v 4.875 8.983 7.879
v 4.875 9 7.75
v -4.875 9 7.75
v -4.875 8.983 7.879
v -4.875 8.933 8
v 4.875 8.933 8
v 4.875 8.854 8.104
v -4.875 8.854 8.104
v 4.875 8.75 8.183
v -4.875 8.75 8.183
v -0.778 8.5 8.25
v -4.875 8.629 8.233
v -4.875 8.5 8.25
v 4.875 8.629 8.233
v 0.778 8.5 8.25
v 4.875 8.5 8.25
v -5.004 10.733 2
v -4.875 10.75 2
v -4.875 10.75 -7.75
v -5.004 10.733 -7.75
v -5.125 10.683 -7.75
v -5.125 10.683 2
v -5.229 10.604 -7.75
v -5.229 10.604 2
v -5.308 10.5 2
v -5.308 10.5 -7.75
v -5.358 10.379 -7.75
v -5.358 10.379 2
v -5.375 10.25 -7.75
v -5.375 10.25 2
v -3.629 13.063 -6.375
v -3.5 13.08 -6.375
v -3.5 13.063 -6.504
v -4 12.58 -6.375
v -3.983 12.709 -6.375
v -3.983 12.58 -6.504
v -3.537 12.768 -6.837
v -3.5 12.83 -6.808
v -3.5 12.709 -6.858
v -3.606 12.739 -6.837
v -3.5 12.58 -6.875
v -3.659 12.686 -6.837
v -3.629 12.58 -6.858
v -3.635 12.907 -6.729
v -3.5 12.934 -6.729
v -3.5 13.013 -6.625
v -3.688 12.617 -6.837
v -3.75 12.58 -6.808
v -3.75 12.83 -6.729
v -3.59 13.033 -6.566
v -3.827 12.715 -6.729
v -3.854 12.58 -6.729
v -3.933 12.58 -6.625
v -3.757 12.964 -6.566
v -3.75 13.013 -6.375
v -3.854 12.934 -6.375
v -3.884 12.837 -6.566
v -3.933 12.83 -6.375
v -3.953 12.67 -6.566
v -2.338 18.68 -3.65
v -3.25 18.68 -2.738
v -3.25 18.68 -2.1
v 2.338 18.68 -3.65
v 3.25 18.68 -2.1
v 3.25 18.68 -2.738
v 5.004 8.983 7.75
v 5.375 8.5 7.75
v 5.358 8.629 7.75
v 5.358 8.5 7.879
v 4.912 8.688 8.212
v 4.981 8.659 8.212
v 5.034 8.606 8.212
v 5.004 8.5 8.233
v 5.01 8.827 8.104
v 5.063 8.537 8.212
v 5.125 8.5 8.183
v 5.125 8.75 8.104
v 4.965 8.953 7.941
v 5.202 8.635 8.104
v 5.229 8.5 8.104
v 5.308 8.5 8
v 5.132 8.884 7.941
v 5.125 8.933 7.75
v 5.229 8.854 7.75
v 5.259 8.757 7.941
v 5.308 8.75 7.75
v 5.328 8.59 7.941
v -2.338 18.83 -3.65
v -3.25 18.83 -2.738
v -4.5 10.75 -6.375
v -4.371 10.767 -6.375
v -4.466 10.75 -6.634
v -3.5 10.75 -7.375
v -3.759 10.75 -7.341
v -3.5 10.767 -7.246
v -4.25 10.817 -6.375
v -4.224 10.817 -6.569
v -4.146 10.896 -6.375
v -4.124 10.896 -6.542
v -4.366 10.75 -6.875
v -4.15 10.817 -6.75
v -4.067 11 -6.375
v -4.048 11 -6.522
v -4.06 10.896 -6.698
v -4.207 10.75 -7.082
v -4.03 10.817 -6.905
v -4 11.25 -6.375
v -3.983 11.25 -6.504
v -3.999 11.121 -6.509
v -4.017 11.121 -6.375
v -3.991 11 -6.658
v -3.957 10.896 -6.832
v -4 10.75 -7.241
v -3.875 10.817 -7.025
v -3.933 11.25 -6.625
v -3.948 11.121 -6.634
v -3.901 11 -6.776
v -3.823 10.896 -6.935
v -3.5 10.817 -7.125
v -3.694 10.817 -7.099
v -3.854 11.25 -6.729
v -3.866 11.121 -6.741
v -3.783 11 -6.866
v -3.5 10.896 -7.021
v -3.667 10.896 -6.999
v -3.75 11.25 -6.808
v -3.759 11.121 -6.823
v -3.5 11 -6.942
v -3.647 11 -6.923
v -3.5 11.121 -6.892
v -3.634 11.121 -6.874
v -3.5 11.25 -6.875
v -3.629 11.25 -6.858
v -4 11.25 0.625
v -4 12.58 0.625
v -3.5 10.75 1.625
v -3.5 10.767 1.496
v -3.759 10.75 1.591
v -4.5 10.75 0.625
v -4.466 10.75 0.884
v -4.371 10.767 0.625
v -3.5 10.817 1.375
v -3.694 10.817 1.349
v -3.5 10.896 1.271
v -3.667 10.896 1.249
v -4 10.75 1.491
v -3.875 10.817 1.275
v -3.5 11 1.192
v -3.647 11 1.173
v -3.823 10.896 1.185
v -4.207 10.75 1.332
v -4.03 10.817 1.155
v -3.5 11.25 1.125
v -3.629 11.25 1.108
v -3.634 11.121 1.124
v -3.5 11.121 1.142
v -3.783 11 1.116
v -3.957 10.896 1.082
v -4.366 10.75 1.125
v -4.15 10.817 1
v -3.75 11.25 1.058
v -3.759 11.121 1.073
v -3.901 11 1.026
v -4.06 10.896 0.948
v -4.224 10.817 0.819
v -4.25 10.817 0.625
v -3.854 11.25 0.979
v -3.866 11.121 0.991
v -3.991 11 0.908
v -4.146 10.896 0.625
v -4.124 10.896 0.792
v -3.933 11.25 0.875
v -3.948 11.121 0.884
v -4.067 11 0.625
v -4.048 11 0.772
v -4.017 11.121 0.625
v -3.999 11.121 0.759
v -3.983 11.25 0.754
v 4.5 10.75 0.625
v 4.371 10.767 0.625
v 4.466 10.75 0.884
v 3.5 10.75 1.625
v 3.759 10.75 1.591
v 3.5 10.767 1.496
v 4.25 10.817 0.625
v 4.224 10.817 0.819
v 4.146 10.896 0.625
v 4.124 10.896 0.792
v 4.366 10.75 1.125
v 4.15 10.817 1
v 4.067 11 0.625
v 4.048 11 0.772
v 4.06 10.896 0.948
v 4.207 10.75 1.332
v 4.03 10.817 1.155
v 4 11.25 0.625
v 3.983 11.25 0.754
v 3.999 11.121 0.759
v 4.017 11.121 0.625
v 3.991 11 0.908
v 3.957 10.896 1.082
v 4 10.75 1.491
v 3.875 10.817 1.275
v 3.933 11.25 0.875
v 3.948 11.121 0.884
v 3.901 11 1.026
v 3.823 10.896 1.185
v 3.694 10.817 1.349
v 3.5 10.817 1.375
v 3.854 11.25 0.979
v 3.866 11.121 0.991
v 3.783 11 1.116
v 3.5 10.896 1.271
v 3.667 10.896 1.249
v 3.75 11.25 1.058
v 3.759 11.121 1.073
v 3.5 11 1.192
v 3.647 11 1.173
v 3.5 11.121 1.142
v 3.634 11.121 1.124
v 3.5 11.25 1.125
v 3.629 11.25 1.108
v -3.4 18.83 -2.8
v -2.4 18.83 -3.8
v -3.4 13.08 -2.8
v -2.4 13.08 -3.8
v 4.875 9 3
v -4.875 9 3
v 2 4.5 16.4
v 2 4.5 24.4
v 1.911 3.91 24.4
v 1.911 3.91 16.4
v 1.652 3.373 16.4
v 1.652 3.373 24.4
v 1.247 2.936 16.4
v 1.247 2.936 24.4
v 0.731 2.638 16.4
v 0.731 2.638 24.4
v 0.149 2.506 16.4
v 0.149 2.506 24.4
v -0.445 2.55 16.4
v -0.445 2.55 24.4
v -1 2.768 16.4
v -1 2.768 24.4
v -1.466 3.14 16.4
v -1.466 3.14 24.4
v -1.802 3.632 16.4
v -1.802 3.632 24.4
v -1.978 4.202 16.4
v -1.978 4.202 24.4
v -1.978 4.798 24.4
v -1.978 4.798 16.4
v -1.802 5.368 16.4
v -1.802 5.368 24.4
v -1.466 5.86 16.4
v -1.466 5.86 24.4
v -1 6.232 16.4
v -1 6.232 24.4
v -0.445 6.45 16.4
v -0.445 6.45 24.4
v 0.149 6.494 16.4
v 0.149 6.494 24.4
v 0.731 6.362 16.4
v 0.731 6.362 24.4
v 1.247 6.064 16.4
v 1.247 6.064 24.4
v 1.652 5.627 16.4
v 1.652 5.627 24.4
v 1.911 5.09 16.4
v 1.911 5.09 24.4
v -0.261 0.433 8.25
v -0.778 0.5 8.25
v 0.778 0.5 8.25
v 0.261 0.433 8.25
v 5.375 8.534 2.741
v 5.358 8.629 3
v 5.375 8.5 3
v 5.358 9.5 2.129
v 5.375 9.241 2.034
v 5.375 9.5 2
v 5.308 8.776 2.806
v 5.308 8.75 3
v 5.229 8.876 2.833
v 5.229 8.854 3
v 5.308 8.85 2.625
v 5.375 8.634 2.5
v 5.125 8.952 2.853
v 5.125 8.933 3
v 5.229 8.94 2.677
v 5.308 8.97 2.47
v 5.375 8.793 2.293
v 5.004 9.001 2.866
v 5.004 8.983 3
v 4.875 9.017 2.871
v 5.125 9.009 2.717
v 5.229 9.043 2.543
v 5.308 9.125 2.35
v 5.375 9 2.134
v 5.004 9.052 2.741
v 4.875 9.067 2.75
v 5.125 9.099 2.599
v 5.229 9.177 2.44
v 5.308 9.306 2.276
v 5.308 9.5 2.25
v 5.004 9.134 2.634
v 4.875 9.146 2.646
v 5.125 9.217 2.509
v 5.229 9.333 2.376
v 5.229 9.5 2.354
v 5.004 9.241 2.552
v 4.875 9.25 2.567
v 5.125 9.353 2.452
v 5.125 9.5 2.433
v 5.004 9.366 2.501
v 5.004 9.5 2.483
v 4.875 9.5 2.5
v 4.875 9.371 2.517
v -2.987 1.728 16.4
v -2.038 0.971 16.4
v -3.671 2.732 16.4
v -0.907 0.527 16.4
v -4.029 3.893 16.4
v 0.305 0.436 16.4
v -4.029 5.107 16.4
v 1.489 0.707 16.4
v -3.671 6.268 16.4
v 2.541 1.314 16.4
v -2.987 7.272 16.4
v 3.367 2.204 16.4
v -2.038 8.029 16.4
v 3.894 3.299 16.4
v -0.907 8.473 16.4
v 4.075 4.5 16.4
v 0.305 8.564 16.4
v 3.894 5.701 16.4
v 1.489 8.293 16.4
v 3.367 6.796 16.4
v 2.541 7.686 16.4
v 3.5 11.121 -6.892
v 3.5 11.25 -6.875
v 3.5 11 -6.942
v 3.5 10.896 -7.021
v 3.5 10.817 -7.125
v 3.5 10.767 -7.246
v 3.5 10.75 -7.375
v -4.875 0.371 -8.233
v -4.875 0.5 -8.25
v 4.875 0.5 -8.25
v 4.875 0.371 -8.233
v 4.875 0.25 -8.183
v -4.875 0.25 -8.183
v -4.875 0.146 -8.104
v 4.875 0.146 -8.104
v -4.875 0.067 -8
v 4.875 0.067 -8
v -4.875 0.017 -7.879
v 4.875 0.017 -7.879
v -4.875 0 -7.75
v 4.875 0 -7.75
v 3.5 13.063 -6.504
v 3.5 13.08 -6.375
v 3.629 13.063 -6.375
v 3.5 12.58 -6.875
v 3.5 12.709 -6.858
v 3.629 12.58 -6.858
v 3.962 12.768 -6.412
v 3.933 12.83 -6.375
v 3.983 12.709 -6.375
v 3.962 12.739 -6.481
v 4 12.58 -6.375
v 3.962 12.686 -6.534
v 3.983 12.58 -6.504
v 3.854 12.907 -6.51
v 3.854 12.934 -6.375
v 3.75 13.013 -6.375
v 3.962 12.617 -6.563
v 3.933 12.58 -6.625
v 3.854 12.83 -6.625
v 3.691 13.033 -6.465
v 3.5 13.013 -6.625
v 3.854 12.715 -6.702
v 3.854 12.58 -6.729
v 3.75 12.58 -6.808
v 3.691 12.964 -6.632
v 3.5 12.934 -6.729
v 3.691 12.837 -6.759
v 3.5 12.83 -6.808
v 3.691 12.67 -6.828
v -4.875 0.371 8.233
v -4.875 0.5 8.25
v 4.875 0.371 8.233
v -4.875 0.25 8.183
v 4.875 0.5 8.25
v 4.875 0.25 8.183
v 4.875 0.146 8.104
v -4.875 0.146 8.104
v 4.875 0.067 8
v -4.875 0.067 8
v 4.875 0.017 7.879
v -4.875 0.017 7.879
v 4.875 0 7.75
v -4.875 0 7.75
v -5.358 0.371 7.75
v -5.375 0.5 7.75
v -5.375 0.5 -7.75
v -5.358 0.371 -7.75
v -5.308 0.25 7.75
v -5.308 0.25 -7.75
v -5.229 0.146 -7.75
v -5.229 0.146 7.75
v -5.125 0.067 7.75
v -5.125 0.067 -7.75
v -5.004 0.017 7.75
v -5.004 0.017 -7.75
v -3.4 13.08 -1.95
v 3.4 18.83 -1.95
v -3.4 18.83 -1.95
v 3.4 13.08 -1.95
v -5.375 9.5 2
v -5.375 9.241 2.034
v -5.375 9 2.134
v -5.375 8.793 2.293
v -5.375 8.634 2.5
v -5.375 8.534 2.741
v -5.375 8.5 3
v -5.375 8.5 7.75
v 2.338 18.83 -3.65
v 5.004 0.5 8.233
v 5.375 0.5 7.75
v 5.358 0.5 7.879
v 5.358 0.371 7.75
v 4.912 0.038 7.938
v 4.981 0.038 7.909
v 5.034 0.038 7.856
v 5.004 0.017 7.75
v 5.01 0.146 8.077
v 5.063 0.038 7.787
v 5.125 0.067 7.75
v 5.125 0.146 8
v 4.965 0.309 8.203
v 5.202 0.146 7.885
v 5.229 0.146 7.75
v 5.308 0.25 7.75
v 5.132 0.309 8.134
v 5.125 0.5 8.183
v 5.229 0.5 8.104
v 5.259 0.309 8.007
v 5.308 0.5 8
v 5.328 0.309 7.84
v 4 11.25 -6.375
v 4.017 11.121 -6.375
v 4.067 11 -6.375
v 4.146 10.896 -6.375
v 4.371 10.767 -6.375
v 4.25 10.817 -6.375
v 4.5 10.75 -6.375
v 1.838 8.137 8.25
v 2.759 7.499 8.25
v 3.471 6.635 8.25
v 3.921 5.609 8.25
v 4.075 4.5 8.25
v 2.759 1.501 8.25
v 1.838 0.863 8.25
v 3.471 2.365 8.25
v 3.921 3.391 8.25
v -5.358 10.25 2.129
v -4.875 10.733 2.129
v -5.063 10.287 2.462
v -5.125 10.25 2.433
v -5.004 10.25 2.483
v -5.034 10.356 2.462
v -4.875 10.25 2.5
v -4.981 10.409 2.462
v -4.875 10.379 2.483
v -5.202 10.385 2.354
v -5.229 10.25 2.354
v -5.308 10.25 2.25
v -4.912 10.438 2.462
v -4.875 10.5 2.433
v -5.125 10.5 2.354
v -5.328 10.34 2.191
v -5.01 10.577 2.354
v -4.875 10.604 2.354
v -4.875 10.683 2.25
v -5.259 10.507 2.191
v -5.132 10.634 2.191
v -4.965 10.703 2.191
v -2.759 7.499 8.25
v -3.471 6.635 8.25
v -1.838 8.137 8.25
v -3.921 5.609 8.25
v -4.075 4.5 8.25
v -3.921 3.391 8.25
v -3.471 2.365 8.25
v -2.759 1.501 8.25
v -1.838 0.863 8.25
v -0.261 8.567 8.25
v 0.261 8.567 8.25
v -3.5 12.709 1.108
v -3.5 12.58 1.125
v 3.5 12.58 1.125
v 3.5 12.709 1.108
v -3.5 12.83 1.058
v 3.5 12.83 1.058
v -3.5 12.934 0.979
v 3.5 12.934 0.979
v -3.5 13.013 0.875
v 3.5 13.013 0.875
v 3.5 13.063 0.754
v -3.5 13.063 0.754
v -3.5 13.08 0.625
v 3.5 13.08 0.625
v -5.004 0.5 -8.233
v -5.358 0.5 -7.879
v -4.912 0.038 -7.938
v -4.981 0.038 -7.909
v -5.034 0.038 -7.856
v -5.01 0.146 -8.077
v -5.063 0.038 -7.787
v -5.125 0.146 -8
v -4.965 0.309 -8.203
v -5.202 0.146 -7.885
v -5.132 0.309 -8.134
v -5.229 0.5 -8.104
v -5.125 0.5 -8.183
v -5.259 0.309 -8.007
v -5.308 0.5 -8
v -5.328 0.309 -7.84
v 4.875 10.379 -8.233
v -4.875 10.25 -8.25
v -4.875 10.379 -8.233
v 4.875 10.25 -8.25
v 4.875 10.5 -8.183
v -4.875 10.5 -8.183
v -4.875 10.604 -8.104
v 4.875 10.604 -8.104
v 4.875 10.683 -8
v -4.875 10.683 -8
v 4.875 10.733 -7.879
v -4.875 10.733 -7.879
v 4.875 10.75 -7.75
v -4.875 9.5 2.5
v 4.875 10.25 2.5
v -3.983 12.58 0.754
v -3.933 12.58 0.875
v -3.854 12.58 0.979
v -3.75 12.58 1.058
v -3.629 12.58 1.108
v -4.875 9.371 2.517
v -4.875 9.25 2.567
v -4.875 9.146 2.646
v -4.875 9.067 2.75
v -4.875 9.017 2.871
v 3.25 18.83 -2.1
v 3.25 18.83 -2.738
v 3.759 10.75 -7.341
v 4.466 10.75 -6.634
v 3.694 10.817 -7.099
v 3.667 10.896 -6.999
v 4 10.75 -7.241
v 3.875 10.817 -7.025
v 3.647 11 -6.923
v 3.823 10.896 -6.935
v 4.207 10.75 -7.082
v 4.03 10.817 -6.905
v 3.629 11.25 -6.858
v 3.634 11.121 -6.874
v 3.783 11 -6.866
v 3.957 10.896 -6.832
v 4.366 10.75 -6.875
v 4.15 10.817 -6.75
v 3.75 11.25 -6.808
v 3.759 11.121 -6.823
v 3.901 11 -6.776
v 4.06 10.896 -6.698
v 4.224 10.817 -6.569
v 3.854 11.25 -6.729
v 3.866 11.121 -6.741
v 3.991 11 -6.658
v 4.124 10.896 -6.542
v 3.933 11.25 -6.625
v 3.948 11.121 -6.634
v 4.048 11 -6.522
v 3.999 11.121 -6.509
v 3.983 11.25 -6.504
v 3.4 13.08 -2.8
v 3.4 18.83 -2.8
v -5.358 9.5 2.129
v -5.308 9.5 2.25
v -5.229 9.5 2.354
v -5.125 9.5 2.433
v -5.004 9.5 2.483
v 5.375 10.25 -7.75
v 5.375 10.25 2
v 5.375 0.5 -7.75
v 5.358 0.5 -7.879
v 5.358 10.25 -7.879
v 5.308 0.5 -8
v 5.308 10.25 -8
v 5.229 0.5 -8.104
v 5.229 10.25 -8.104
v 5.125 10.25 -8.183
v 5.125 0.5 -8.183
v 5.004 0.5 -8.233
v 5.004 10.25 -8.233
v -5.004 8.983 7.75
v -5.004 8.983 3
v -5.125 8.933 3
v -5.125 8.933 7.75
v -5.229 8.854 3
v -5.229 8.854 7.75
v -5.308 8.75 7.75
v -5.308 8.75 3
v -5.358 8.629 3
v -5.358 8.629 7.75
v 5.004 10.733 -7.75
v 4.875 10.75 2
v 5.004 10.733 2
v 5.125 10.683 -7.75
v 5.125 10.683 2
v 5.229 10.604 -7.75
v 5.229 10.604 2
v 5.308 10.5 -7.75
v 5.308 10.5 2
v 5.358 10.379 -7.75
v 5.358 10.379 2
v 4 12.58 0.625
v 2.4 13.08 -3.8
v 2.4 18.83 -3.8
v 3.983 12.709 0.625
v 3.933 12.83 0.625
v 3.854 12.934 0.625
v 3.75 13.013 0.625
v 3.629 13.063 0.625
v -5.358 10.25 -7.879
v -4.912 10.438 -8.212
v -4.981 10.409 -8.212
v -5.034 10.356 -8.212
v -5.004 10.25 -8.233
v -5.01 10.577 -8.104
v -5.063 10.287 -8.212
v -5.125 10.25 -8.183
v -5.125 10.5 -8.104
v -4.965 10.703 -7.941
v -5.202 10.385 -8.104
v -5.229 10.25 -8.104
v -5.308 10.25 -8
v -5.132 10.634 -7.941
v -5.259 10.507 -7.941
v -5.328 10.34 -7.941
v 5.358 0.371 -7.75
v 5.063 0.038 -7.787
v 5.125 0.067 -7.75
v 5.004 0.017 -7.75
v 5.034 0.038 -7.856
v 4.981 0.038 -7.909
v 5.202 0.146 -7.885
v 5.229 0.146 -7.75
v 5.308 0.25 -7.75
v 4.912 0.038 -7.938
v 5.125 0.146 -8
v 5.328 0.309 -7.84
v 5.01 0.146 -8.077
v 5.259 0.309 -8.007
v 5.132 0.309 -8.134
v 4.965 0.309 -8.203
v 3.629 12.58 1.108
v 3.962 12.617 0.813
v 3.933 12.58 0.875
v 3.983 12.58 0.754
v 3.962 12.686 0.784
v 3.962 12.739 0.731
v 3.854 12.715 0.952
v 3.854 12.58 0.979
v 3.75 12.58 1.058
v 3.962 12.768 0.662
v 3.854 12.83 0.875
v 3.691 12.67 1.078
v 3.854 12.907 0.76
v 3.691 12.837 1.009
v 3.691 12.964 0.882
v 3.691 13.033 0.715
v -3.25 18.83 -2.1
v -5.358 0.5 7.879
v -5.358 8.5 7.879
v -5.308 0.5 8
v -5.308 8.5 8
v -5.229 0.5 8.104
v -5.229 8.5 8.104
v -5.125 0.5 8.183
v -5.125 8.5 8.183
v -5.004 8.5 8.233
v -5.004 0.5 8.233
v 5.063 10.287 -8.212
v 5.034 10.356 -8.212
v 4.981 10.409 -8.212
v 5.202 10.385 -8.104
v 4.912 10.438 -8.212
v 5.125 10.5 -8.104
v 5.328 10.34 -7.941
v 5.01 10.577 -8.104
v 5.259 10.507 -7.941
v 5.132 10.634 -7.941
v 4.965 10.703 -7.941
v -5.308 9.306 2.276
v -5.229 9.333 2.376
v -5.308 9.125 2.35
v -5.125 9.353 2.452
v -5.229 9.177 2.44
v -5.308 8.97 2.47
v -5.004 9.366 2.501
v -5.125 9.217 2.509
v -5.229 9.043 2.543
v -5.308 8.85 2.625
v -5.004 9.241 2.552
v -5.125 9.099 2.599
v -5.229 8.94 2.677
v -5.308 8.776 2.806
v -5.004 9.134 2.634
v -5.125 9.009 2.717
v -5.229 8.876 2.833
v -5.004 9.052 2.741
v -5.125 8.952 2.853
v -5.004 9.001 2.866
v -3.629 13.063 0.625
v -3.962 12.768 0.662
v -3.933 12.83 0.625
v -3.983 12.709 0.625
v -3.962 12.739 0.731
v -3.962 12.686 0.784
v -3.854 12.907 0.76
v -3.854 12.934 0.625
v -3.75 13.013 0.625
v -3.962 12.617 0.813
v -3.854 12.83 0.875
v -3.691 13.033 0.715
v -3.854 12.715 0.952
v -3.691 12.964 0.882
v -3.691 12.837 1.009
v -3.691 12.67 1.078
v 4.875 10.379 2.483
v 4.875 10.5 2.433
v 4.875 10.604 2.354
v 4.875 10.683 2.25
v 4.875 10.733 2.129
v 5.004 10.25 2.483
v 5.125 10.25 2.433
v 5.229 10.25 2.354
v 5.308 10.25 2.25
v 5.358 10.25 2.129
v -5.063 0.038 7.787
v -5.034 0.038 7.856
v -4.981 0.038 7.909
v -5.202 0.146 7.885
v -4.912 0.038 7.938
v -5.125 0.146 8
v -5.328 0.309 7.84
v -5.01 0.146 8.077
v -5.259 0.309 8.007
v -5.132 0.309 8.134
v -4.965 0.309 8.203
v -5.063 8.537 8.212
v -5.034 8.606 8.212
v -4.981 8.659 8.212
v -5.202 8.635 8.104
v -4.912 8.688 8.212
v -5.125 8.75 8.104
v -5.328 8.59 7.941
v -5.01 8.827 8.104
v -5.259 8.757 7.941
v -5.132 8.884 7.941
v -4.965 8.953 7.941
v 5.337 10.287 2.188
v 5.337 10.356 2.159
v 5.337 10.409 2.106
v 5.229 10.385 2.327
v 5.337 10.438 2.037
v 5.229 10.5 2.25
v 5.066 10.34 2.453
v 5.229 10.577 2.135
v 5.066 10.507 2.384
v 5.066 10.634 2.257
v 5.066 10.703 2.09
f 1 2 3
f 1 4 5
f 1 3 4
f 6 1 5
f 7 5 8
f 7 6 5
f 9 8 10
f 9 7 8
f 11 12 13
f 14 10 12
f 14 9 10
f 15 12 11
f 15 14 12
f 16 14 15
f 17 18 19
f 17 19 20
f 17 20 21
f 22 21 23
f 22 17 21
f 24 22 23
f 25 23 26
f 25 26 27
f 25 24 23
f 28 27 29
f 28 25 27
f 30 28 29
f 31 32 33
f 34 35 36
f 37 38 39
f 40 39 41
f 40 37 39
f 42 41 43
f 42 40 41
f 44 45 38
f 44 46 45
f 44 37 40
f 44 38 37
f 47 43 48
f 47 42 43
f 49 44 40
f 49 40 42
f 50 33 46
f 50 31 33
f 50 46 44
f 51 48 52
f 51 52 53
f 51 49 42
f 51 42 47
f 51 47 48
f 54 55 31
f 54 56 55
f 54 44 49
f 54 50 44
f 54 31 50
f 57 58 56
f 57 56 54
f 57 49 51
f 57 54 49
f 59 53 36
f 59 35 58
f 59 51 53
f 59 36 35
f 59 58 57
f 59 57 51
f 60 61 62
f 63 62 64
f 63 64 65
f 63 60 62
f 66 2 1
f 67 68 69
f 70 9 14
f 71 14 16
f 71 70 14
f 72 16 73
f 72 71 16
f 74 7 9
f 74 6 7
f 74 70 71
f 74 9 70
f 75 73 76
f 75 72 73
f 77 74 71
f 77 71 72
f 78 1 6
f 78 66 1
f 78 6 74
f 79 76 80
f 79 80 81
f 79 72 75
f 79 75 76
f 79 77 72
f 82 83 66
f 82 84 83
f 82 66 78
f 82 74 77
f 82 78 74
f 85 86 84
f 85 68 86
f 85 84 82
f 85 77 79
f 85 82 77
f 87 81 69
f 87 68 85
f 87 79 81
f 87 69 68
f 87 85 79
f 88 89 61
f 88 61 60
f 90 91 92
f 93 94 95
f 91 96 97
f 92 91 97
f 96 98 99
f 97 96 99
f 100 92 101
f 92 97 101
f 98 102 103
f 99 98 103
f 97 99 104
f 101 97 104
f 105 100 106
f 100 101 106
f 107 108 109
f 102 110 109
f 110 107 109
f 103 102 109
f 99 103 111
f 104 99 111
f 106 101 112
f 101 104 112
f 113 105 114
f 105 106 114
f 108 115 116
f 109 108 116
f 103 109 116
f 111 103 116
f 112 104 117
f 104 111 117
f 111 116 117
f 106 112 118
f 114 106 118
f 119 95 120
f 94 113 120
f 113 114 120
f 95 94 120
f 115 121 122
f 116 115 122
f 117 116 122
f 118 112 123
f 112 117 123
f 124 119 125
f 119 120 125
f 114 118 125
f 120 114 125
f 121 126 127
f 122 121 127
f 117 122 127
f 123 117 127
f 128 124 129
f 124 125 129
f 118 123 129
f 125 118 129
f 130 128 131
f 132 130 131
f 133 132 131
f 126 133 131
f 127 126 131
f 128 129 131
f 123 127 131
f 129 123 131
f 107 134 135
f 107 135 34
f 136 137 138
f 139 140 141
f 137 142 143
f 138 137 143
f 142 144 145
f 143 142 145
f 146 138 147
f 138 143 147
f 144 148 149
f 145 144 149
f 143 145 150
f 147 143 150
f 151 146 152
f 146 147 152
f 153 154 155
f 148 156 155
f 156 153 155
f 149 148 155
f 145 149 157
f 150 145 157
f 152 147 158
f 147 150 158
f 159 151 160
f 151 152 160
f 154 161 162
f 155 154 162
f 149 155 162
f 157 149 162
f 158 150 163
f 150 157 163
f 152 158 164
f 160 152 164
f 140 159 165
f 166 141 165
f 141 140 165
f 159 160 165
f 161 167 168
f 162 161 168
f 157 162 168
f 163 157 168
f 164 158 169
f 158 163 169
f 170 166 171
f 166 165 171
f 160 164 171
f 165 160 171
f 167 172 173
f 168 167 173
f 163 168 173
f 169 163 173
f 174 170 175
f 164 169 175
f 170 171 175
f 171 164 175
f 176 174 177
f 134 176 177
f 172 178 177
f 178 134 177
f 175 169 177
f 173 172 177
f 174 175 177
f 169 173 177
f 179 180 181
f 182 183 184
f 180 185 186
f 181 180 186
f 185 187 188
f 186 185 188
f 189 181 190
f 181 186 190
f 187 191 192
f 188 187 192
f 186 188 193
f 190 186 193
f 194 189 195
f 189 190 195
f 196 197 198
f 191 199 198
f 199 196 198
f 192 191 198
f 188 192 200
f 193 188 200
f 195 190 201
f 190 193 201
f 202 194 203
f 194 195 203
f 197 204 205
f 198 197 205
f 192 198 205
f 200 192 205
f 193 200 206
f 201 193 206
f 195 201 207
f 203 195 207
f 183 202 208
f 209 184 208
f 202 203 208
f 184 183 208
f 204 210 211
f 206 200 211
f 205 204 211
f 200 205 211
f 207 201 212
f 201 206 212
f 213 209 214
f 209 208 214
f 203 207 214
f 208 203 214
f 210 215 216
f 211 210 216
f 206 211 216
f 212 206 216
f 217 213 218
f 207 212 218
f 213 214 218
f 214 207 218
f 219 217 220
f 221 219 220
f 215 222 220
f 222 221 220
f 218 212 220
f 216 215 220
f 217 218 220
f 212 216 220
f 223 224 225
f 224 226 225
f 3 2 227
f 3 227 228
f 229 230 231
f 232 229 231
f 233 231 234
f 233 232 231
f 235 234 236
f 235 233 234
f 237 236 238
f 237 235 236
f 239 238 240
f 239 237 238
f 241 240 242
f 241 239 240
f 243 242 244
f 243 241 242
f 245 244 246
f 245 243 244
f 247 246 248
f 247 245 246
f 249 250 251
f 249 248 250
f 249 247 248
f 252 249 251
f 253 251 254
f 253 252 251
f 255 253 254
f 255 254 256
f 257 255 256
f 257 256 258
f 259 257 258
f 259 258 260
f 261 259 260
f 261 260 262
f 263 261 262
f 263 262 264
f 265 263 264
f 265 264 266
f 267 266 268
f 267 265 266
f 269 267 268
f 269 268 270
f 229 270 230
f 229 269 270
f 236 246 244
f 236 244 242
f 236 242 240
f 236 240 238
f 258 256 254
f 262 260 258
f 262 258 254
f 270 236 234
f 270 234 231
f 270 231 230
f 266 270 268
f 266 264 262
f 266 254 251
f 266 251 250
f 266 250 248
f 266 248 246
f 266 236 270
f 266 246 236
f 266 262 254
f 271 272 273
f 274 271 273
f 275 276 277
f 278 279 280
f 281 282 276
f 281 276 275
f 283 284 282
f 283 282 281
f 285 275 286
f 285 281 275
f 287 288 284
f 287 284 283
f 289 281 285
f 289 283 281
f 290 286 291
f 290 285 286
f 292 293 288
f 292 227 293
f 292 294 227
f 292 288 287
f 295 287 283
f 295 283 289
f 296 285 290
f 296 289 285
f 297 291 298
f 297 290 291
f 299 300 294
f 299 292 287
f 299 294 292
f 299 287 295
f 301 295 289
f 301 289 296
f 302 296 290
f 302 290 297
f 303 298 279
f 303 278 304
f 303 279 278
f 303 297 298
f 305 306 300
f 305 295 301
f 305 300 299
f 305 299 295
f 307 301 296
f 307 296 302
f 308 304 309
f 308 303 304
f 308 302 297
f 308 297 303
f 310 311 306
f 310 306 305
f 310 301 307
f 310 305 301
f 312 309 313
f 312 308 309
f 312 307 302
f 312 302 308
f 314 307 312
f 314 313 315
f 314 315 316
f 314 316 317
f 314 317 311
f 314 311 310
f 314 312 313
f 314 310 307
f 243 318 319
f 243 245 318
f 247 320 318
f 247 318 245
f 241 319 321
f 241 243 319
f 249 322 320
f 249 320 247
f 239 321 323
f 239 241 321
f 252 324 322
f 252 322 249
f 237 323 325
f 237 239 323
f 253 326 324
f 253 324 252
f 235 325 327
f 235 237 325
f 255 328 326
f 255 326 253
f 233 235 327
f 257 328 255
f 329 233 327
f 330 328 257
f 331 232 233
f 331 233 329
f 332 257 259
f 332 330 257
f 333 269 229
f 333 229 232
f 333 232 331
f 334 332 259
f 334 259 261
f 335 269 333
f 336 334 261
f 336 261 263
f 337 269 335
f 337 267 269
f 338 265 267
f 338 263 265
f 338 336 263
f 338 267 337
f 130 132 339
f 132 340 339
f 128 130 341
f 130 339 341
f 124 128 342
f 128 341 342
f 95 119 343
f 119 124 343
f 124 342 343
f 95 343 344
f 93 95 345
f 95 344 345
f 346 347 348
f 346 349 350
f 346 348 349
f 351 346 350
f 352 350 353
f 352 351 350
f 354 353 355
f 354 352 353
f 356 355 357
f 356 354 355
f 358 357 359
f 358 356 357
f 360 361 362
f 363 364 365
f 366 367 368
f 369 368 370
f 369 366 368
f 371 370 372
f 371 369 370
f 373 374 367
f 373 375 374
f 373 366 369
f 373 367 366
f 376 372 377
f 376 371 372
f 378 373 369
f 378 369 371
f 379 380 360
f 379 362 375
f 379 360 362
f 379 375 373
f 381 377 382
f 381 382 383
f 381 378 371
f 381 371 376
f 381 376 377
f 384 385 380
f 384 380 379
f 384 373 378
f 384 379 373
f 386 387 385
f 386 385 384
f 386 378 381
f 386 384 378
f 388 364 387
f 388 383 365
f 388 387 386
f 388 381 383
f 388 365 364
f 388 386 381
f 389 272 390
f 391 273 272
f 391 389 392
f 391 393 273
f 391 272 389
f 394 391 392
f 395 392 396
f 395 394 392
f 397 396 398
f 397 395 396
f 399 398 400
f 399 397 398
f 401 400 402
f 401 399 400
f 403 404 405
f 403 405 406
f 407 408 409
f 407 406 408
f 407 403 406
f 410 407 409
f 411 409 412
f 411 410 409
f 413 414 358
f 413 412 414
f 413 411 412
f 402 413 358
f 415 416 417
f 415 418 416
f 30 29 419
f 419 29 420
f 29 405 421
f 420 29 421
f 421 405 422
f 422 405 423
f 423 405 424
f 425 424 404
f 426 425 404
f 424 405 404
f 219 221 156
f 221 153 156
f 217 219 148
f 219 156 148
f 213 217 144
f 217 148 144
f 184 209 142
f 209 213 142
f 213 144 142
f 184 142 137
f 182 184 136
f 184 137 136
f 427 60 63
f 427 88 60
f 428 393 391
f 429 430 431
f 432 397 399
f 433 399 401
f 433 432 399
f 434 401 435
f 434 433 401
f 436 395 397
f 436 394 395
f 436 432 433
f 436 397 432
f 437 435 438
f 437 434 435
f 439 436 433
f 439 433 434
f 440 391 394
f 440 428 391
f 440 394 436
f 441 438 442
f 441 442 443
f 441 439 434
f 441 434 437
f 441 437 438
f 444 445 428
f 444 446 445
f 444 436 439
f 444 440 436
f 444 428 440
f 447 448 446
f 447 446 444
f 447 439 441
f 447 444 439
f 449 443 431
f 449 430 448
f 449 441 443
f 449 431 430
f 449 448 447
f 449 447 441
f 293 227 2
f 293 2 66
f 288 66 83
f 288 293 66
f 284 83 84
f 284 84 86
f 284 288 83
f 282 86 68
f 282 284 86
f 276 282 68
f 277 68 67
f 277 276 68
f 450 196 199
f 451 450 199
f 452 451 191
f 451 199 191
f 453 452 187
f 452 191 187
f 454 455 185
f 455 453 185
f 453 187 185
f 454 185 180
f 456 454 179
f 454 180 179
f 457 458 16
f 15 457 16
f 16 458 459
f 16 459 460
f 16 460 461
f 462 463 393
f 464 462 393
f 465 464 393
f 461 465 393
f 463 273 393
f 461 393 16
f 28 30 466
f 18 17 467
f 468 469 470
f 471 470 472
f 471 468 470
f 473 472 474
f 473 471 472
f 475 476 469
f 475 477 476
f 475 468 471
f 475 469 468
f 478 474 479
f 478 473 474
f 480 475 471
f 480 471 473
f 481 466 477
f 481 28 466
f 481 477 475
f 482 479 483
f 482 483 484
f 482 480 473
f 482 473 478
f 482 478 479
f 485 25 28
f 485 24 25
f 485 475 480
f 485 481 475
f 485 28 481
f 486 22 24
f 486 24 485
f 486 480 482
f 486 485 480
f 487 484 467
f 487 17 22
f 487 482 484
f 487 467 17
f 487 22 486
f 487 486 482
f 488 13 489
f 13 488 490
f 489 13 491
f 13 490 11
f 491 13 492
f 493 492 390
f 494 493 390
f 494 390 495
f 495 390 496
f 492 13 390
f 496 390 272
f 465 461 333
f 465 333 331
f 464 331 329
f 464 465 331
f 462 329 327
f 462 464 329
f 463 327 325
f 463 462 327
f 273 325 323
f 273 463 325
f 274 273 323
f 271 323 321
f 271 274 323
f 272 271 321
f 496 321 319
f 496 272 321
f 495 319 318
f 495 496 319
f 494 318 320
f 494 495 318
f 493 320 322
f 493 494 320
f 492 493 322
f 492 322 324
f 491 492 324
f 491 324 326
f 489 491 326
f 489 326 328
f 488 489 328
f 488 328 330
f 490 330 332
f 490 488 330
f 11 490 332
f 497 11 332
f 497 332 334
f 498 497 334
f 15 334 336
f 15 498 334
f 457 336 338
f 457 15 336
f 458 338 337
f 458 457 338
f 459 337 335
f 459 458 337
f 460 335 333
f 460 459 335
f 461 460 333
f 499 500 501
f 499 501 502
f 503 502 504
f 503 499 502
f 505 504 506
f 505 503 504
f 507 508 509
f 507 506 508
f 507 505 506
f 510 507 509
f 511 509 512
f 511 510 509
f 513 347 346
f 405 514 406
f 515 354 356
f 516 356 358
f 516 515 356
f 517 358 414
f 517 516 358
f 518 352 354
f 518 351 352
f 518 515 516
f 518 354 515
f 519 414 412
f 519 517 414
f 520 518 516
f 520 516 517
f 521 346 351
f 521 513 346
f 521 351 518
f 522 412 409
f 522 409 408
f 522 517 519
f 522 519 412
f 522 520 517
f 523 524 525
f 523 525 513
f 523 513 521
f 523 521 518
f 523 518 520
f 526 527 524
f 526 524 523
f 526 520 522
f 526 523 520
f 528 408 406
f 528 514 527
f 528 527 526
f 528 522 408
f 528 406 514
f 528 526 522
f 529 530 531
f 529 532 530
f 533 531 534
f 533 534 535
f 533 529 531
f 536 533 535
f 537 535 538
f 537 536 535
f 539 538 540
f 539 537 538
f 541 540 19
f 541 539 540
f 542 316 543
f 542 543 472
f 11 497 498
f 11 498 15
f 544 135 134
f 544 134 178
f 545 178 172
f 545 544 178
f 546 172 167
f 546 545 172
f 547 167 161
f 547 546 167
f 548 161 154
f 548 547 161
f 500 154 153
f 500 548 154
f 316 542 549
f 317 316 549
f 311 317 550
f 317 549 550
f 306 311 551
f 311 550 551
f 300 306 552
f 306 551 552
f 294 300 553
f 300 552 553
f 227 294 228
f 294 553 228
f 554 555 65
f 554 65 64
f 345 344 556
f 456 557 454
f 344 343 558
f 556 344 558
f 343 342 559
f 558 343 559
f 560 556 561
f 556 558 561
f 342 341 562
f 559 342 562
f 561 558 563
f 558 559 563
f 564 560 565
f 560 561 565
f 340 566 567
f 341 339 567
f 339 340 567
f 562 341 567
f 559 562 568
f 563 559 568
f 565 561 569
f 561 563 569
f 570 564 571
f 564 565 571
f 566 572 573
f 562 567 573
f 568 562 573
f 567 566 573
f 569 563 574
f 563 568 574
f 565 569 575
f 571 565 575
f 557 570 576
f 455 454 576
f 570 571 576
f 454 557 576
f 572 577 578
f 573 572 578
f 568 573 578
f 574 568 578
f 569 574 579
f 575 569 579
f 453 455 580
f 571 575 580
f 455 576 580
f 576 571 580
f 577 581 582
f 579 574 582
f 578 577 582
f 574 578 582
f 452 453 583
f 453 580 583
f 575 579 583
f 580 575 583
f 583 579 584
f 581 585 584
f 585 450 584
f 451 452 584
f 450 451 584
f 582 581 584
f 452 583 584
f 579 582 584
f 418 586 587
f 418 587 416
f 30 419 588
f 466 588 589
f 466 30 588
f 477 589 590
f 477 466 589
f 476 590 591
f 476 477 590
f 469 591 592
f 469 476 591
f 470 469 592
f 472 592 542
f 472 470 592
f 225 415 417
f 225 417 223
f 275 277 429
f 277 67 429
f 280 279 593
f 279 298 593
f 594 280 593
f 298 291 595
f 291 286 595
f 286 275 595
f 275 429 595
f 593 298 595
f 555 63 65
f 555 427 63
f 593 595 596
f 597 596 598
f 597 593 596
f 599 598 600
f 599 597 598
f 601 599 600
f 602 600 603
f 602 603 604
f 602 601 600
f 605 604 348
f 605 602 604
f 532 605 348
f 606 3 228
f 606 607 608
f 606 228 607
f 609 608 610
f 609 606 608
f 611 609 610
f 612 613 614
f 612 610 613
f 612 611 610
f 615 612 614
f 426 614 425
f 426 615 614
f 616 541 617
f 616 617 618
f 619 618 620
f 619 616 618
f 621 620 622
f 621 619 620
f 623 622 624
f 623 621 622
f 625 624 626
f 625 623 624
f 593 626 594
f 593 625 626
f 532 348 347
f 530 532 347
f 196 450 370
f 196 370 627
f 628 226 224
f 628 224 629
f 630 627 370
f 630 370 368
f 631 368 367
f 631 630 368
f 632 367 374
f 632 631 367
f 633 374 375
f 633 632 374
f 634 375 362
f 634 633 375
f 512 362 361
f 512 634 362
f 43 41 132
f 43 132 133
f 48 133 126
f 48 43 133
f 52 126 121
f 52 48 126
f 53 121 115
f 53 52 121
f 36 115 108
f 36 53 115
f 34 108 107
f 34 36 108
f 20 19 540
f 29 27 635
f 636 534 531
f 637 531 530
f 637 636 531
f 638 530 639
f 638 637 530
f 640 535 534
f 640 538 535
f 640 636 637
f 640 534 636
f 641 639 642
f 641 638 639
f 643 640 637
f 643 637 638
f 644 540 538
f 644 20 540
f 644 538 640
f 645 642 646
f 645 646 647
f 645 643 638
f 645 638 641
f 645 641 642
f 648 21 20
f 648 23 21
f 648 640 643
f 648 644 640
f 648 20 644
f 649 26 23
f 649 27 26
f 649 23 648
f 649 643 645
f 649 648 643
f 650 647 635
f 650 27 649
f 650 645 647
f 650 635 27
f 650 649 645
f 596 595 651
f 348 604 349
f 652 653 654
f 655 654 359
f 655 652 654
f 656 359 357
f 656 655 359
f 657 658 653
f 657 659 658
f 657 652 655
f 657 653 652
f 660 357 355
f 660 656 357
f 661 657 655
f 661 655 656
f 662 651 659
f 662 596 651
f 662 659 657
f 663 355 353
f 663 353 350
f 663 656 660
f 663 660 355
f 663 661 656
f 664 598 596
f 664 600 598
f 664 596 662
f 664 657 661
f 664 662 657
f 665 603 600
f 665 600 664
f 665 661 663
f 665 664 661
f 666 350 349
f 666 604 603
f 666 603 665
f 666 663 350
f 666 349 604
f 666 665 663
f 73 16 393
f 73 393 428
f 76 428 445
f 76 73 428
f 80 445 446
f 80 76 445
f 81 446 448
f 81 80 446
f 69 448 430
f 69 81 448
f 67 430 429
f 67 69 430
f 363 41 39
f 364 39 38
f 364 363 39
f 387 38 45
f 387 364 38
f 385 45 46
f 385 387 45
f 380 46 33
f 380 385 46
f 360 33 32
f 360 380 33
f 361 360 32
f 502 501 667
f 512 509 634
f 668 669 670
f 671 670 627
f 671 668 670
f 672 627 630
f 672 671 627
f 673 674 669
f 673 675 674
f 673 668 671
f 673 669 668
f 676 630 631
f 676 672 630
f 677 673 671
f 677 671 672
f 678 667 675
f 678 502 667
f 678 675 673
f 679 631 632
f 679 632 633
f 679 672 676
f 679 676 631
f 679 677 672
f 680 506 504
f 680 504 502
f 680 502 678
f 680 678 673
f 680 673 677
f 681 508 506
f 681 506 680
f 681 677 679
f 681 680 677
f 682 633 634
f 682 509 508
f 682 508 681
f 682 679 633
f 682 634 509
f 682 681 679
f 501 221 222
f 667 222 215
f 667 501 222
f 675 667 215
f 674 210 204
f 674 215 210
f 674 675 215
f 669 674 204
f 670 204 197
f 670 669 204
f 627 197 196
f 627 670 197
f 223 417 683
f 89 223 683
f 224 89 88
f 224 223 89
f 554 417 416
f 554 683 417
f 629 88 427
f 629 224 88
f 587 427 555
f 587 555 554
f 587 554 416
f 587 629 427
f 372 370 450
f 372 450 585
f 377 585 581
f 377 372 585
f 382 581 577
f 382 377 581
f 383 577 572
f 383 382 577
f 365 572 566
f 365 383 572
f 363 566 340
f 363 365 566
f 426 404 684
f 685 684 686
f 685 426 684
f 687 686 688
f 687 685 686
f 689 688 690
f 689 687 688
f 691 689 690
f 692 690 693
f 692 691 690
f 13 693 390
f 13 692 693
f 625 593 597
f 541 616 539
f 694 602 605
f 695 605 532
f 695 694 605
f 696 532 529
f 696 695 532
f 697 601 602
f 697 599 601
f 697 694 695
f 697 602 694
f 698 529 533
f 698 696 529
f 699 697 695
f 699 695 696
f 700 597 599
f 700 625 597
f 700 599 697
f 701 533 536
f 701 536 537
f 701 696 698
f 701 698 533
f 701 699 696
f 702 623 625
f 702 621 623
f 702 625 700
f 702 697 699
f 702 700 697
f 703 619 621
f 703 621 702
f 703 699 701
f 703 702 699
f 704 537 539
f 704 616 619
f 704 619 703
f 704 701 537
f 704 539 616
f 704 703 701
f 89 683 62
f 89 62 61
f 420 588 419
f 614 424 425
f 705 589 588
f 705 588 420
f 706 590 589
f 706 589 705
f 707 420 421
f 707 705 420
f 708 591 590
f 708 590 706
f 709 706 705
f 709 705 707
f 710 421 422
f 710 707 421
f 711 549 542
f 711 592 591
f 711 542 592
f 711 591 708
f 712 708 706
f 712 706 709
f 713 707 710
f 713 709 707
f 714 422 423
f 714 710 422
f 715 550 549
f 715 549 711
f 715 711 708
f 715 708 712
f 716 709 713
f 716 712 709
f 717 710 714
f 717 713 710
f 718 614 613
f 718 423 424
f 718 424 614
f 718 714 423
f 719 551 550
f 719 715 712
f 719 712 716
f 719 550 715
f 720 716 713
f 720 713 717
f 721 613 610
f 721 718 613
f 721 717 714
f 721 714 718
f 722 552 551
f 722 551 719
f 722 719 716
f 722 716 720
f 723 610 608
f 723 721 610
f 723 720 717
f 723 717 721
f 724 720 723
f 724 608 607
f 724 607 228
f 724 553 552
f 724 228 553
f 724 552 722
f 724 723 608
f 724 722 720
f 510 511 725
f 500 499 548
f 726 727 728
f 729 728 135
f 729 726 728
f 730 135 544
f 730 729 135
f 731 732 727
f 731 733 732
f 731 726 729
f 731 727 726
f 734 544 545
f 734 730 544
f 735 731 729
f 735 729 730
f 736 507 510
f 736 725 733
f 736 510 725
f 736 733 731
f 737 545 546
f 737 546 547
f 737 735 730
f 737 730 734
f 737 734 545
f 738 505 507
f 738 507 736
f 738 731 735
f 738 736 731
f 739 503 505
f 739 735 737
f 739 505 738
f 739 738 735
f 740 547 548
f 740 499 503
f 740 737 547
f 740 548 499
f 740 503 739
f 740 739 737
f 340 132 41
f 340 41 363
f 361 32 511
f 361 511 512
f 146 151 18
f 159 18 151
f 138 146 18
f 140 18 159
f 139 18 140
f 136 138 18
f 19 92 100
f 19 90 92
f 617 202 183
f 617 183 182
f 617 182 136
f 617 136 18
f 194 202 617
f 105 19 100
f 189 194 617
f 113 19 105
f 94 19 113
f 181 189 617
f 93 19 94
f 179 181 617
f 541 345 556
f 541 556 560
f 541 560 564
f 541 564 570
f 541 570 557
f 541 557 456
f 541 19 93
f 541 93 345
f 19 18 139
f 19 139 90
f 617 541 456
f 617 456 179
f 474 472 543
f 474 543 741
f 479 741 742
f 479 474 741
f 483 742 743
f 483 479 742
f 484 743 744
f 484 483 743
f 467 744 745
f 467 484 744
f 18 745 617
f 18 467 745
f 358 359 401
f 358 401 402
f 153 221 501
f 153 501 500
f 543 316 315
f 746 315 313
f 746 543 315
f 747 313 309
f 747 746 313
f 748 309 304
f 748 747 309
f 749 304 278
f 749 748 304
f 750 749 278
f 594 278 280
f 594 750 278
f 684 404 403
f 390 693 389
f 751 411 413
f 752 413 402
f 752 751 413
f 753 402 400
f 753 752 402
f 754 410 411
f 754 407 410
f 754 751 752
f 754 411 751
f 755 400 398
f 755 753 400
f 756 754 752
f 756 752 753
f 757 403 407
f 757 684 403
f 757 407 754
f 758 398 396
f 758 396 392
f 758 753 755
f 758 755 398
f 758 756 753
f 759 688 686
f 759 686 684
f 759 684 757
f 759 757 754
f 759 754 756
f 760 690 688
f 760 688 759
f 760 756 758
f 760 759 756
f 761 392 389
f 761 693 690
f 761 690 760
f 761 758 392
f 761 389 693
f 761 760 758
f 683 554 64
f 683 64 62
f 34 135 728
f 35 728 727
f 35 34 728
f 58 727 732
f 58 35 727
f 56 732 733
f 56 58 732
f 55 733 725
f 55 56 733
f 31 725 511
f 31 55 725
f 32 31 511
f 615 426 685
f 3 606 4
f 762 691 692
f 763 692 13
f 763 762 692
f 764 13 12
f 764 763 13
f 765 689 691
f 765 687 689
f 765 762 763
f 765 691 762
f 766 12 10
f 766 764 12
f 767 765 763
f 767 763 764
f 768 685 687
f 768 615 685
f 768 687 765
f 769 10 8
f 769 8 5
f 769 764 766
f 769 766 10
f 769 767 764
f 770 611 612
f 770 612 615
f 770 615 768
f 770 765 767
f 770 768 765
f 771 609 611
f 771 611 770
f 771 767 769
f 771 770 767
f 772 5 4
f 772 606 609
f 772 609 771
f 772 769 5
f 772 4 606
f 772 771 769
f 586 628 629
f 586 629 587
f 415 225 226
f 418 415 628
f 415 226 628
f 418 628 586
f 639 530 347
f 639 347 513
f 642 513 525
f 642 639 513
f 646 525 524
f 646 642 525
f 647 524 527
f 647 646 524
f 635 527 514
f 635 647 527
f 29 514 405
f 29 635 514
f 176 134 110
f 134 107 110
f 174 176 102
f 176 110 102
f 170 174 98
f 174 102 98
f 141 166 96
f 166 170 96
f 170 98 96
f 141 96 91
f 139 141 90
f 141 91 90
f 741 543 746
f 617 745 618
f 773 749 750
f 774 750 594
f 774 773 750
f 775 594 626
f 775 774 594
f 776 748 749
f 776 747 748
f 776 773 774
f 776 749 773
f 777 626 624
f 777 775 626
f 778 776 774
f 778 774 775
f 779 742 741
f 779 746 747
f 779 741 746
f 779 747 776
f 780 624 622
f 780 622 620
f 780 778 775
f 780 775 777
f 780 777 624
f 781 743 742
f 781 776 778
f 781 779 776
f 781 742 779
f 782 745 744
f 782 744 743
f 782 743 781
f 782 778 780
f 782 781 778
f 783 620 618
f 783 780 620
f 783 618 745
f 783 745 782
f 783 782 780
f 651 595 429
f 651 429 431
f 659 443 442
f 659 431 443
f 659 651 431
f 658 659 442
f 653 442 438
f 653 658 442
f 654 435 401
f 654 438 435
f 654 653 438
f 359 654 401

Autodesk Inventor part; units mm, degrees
ref_plane "YZ Plane" through (0, 0, 0) normal (1, 0, 0) x (0, 1, 0)
ref_plane "XZ Plane" through (0, 0, 0) normal (0, 1, 0) x (-1, 0, 0)
ref_plane "XY Plane" through (0, 0, 0) normal (0, 0, 1) x (1, 0, 0)
sketch "Sketch1" plane through (0, 0, 0) normal (0, 1, 0) x (-1, 0, 0)
  line L0 (-5.375, -8.25) -> (5.375, -8.25)
  line L1 (5.375, -8.25) -> (5.375, 8.25)
  line L2 (5.375, 8.25) -> (-5.375, 8.25)
  line L3 (-5.375, 8.25) -> (-5.375, -8.25)
  line L4 (-5.375, -8.25) -> (5.375, 8.25) construction
  line L5 (5.375, -8.25) -> (-5.375, 8.25) construction
  point P0 (0, 0)
  dimension "d0" = 10.75
  dimension "d1" = 16.5
extrude "Extrusion1" add sketch "Sketch1" along normal blind 9
sketch "Sketch2" plane through (0, 9, 0) normal (0, 1, 0) x (1, 0, 0)
  line L0 (-5.375, 8.25) -> (-5.375, -8.25) projected
  line L1 (5.375, -8.25) -> (5.375, 8.25) projected
  line L2 (-5.375, 8.25) -> (5.375, 8.25)
  line L3 (5.375, 8.25) -> (5.375, -2.5)
  line L4 (5.375, -2.5) -> (-5.375, -2.5)
  line L5 (-5.375, -2.5) -> (-5.375, 8.25)
  point P0 (0, 0)
  dimension "d4" = 10.75
extrude "Extrusion2" add sketch "Sketch2" along normal blind 1.75
sketch "Sketch3" plane through (0, 10.75, 0) normal (0, 1, 0) x (1, 0, 0)
  line L0 (5.375, 8.25) -> (-5.375, 8.25) construction
  line L1 (-5.375, 8.25) -> (-5.375, -2.5) construction
  line L2 (-5.375, -2.5) -> (5.375, -2.5) construction
  line L3 (5.375, -2.5) -> (5.375, 8.25) construction
  line L4 (5.375, 2.875) -> (-5.375, 2.875) construction
  line L5 (4, -1.125) -> (-4, -1.125)
  line L6 (-4, -1.125) -> (-4, 6.875)
  line L7 (-4, 6.875) -> (4, 6.875)
  line L8 (4, 6.875) -> (4, -1.125)
  line L9 (4, -1.125) -> (-4, 6.875) construction
  line L10 (-4, -1.125) -> (4, 6.875) construction
  point P0 (0, 0)
  point P1 (0, 2.875)
  dimension "d7" = 8
  dimension "d8" = 8
extrude "Extrusion3" add sketch "Sketch3" along normal blind 2.33
fillet "Fillet1" radius 0.5 30 edges at (0, 13.08, 1.125) (-4, 13.08, -2.875) (0, 13.08, -6.875) (4, 13.08, -2.875) (4, 11.915, 1.125) (-4, 11.915, 1.125) (-4, 11.915, -6.875) (4, 11.915, -6.875) (0, 10.75, -6.875) (4, 10.75, -2.875) (0, 10.75, 1.125) (-4, 10.75, -2.875) (-5.375, 10.75, -2.875) (-5.375, 9.875, 2.5) (0, 10.75, 2.5) (5.375, 10.75, -2.875) (5.375, 9.875, 2.5) (5.375, 5.375, -8.25) (0, 10.75, -8.25) (-5.375, 5.375, -8.25) (-5.375, 9, 5.375) (5.375, 9, 5.375) (0, 9, 8.25) (5.375, 4.5, 8.25) (-5.375, 4.5, 8.25) (0, 0, 8.25) (5.375, 0, 0) (-5.375, 0, 0) (0, 0, -8.25) (0, 9, 2.5)
sketch "Sketch4" plane through (-4.875, 0.5, 8.25) normal (0, 0, 1) x (1, 0, 0)
  line L0 (9.75, 0) -> (0, 0) construction
  line L1 (9.75, 8) -> (9.75, 0) construction
  line L2 (0, 8) -> (9.75, 8) construction
  line L3 (0, 0) -> (0, 8) construction
  line L4 (0, 4) -> (9.75, 4) construction
  circle A0 centre (4.875, 4) radius 4.075
  point P0 (4.875, -0.5)
  dimension "d12" = 8.15
extrude "Extrusion4" add sketch "Sketch4" along normal blind 8.15
sketch "Sketch5" plane through (0, 13.08, 0) normal (0, 1, 0) x (1, 0, 0)
  line L0 (3.5, 6.375) -> (3.5, -0.625) construction
  line L1 (-3.5, 6.375) -> (3.5, 6.375) construction
  line L2 (-3.5, -0.625) -> (-3.5, 6.375) construction
  line L3 (3.5, -0.625) -> (-3.5, -0.625) construction
  line L4 (3.5, 2.875) -> (-3.5, 2.875) construction
  line L5 (3.4, 1.95) -> (-3.4, 1.95)
  line L6 (-3.4, 1.95) -> (-3.4, 3.8)
  line L7 (-3.4, 3.8) -> (3.4, 3.8)
  line L8 (3.4, 3.8) -> (3.4, 1.95)
  line L9 (3.4, 1.95) -> (-3.4, 3.8) construction
  line L10 (-3.4, 1.95) -> (3.4, 3.8) construction
  line L11 (2.4, 3.8) -> (3.4, 2.8)
  line L12 (-2.4, 3.8) -> (-3.4, 2.8)
  point P0 (0, 0)
  point P1 (0, 2.875)
  dimension "d15" = 6.8
  dimension "d16" = 1.85
  dimension "d17" = 0.85
  dimension "d18" = 1
  dimension "d19" = 1
  dimension "d20" = 0.85
extrude "Extrusion5" add sketch "Sketch5" along normal blind 5.75 separate body contours L5 L6 L12 L7 L11 L8
sketch "Sketch6" plane through (0, 18.83, 0) normal (0, 1, 0) x (1, 0, 0)
  line L0 (3.4, 1.95) -> (3.4, 2.8) construction
  line L1 (3.4, 2.8) -> (2.4, 3.8) construction
  line L2 (2.4, 3.8) -> (-2.4, 3.8) construction
  line L3 (-2.4, 3.8) -> (-3.4, 2.8) construction
  line L4 (-3.4, 2.8) -> (-3.4, 1.95) construction
  line L5 (-3.4, 1.95) -> (3.4, 1.95) construction
  line L6 (-2.3379, 3.65) -> (2.3379, 3.65)
  line L7 (2.3379, 3.65) -> (3.25, 2.7379)
  line L8 (3.25, 2.7379) -> (3.25, 2.1)
  line L9 (3.25, 2.1) -> (-3.25, 2.1)
  line L10 (-3.25, 2.1) -> (-3.25, 2.7379)
  line L11 (-3.25, 2.7379) -> (-2.3379, 3.65)
  point P0 (0, 0)
  dimension "d23" = 0.15
extrude "Extrusion6" cut sketch "Sketch6" against normal blind 0.15 bodies 2
sketch "Sketch7" plane through (0, 4.5, 16.4) normal (0, 0, 1) x (1, 0, 0)
  arc A0 (-0.7782, 4) -> (-0.7782, -4) centre (0, 0) ccw projected
  circle A1 centre (0, 0) radius 2
  point P0 (0, -4.5)
  dimension "d26" = 4
extrude "Extrusion7" add sketch "Sketch7" along normal blind 8 bodies 1
equation "\"d4\" = d0"
properties part number "USB Micro Right Angle Plug"
